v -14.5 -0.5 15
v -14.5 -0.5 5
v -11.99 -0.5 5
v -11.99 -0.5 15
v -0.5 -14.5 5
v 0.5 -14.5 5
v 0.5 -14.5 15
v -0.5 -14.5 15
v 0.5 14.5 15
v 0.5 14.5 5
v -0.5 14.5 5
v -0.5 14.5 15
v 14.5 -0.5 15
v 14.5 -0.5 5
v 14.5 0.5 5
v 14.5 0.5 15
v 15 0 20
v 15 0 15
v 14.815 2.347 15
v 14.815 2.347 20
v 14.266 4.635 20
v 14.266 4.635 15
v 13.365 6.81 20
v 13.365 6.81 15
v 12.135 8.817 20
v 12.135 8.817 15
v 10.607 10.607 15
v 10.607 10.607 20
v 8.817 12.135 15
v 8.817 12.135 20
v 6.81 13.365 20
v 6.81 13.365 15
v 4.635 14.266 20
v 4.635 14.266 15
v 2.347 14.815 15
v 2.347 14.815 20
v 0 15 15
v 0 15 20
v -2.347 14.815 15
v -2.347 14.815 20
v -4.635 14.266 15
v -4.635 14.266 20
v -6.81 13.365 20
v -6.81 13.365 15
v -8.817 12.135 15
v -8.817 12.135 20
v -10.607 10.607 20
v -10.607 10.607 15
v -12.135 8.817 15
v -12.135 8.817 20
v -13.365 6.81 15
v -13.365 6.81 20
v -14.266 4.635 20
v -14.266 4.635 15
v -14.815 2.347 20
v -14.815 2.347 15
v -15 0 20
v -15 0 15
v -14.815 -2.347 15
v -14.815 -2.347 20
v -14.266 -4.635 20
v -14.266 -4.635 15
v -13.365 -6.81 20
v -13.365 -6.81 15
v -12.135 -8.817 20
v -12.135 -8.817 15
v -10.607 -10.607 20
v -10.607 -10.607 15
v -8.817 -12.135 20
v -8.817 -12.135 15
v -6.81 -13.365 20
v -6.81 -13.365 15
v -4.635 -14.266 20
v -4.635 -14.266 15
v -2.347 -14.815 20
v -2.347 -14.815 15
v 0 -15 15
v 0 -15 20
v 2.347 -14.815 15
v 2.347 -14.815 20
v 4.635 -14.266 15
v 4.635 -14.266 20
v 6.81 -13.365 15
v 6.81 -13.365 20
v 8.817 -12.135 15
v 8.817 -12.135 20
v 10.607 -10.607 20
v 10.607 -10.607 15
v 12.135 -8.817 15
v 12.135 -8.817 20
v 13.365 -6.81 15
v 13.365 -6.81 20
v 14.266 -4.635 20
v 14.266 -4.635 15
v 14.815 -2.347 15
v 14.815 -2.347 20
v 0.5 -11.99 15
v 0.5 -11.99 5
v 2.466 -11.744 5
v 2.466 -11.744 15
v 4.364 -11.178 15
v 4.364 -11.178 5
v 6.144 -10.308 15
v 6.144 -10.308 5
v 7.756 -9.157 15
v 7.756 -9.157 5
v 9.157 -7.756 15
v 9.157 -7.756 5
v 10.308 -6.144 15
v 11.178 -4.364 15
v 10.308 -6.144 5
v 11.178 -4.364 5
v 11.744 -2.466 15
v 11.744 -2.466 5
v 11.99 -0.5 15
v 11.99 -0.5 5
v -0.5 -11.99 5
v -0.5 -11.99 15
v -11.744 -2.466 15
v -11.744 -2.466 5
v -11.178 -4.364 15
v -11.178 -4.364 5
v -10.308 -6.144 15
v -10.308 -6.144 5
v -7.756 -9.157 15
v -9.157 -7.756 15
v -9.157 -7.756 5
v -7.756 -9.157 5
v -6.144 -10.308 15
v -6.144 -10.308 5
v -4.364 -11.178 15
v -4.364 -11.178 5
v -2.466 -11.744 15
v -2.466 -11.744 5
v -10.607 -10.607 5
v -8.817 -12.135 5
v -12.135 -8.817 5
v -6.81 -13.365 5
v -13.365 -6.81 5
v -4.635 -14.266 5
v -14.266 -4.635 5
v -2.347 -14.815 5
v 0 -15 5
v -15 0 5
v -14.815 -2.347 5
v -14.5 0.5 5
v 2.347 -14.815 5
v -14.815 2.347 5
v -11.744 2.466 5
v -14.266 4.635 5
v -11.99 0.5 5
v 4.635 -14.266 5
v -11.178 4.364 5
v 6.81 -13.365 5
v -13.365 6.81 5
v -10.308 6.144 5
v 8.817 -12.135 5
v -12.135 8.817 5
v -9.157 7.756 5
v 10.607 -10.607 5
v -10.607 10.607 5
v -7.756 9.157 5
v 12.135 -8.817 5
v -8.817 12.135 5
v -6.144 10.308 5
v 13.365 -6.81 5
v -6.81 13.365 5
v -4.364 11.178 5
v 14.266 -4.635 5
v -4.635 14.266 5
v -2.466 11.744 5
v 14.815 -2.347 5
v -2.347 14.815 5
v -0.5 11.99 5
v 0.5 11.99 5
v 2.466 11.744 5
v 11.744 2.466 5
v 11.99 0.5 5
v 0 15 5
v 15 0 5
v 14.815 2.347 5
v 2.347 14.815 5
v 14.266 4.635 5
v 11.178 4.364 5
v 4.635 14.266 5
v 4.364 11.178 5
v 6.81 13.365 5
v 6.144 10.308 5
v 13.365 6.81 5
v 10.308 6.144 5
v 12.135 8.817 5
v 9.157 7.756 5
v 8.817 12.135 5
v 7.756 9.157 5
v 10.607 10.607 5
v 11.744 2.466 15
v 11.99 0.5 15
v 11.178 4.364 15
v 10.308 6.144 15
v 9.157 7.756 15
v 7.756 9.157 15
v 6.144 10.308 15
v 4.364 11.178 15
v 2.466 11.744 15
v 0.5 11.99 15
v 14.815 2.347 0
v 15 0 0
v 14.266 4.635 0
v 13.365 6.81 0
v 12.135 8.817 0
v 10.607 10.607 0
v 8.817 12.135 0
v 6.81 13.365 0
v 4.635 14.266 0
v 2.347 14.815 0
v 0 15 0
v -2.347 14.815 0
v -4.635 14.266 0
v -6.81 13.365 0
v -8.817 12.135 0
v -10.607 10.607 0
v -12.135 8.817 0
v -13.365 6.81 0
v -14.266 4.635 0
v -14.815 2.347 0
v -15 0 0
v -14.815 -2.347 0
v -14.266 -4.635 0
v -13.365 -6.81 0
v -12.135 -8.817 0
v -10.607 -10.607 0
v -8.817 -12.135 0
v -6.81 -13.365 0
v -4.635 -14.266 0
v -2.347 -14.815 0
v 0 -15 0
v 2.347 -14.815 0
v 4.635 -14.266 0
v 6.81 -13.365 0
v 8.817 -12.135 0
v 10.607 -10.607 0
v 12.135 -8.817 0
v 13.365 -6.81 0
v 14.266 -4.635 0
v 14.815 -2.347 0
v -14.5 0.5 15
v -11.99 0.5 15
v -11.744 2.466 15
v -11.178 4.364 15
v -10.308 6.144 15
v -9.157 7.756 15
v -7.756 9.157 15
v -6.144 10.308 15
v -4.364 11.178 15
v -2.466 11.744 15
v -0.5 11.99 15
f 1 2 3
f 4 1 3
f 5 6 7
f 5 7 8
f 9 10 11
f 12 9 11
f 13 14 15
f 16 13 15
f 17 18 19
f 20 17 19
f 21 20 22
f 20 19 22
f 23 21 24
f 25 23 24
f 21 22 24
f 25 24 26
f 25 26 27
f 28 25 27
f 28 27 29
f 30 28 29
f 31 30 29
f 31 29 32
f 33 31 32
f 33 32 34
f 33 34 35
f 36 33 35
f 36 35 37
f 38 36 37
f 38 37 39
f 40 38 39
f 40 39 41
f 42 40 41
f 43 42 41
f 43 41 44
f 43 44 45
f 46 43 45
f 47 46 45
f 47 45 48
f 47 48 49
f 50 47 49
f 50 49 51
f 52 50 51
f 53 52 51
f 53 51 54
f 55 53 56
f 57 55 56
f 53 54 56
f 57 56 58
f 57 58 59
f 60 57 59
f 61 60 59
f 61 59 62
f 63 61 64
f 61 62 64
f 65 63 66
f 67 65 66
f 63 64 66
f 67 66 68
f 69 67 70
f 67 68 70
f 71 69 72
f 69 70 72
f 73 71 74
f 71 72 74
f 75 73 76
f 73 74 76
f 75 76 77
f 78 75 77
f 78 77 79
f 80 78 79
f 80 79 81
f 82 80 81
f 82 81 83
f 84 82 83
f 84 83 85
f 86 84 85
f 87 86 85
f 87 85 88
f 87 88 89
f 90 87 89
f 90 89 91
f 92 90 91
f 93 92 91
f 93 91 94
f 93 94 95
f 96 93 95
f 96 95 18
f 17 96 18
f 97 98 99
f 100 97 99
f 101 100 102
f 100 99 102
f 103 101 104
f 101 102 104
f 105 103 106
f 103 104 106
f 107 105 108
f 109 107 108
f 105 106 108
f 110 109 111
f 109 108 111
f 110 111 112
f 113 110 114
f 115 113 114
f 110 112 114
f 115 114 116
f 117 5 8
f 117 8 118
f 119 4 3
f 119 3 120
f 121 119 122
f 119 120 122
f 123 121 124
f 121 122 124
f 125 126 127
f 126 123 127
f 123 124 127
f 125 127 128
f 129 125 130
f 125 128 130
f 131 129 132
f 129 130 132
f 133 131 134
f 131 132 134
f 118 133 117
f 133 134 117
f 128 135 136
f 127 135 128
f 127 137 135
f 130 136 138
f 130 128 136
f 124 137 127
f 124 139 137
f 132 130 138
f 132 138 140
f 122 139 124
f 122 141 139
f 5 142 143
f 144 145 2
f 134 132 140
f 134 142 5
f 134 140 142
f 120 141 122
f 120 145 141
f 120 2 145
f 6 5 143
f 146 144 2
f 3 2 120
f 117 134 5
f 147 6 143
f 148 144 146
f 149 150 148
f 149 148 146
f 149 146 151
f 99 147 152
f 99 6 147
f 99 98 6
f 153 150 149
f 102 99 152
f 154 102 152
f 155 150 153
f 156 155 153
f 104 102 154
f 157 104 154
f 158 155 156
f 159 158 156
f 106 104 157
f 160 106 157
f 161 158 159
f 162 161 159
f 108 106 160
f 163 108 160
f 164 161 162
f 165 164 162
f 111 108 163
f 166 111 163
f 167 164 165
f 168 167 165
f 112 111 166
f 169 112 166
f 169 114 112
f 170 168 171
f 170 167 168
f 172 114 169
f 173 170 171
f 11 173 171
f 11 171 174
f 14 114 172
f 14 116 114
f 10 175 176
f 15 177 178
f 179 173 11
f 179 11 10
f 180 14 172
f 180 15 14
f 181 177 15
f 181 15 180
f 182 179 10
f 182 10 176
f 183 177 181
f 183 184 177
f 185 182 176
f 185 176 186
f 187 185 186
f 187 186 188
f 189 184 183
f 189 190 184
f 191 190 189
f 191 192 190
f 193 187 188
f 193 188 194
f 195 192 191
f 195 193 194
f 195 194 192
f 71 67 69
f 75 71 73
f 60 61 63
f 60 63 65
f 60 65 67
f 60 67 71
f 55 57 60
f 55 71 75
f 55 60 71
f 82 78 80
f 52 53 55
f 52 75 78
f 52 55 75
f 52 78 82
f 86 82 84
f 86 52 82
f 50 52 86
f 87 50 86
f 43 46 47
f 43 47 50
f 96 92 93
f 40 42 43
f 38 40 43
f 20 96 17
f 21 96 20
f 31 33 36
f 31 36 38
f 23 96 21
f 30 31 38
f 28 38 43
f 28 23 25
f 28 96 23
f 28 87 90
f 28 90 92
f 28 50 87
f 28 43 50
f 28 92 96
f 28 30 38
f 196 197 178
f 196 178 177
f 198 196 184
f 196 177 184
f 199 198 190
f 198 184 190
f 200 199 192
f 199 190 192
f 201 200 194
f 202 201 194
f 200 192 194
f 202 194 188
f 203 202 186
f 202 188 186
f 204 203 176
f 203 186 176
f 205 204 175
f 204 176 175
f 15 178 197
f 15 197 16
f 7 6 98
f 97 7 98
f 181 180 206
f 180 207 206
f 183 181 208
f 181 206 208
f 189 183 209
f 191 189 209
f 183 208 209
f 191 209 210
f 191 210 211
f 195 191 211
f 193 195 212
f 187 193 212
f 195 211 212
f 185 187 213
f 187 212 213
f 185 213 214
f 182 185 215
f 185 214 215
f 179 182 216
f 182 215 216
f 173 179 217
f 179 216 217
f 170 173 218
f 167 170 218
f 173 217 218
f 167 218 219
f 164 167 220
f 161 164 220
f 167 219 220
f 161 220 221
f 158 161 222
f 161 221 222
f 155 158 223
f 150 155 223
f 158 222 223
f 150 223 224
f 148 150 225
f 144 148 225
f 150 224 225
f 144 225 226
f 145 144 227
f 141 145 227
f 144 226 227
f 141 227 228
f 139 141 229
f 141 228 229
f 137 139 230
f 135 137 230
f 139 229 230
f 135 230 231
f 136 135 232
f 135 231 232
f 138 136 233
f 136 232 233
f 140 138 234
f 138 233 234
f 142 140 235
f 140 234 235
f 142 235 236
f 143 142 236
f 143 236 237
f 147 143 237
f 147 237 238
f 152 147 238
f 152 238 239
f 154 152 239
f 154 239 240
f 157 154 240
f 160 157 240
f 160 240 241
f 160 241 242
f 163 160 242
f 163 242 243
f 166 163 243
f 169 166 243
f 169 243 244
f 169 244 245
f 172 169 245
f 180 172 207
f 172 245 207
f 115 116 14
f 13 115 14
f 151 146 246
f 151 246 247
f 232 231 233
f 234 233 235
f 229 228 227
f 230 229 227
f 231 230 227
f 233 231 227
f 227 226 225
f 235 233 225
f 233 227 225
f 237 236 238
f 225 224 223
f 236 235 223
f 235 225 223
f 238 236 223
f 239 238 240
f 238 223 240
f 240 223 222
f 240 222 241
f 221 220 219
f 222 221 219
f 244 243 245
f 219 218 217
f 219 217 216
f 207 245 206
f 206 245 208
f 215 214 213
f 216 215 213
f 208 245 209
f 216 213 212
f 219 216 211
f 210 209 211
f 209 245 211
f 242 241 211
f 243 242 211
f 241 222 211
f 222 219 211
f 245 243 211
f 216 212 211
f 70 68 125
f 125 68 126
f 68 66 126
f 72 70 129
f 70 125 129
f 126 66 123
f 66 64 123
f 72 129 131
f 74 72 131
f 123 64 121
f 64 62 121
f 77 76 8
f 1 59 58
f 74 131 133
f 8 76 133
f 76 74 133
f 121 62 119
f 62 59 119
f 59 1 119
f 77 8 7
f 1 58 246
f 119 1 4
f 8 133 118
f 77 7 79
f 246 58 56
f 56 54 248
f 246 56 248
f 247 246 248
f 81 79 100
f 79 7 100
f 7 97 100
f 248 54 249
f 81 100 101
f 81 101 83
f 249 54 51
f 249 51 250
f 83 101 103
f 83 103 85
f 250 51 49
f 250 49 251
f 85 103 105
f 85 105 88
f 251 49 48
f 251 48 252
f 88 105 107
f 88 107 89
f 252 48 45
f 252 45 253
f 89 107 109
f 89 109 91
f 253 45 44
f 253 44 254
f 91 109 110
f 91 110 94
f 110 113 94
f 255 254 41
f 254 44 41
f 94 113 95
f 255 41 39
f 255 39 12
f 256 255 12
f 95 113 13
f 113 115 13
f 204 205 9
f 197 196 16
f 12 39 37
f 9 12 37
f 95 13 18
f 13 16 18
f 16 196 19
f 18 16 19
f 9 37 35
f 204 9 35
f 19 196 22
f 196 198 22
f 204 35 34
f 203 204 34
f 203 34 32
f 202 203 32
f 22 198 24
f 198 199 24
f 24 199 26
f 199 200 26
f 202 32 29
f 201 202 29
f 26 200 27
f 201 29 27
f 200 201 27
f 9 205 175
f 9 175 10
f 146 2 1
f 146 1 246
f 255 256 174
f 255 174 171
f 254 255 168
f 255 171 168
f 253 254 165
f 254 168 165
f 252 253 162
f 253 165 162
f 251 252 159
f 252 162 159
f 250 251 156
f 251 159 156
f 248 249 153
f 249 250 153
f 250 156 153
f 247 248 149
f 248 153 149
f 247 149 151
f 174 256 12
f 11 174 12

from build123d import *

# Parameters (mm, degrees)
CYLINDER005_R               = 12
CYLINDER005_DEPTH           = 20
CYLINDER006_R               = 15
CYLINDER006_DEPTH           = 3.5
CYLINDER007_R               = 15
CYLINDER007_DEPTH           = 1.5
CYLINDER008_R               = 15
CYLINDER008_DEPTH           = 1.5
CYLINDER009_R               = 15
CYLINDER009_DEPTH           = 3.5
BOX002_W                    = 29
BOX002_H                    = 1
BOX002_DEPTH                = 10
BOX003_W                    = 29
BOX003_H                    = 1
BOX003_DEPTH                = 10
COMPOUND001_PLACEMENT_ANGLE = 90


with BuildPart() as cylinder005:
    # Cylinder005 → Cylinder005 (new body)
    with BuildSketch(Plane.XY):
        Circle(CYLINDER005_R)
    extrude(amount=CYLINDER005_DEPTH)


with BuildPart() as cylinder006:
    # Cylinder006 → Cylinder006 (new body)
    with BuildSketch(Plane.XY):
        Circle(CYLINDER006_R)
    extrude(amount=CYLINDER006_DEPTH)


with BuildPart() as cylinder007:
    # Cylinder007 → Cylinder007 (new body)
    with BuildSketch(Plane.XY.offset(3.5)):
        Circle(CYLINDER007_R)
    extrude(amount=CYLINDER007_DEPTH)


with BuildPart() as cylinder008:
    # Cylinder008 → Cylinder008 (new body)
    with BuildSketch(Plane.XY.offset(18.5)):
        Circle(CYLINDER008_R)
    extrude(amount=CYLINDER008_DEPTH)


with BuildPart() as cylinder009:
    # Cylinder009 → Cylinder009 (new body)
    with BuildSketch(Plane.XY.offset(15)):
        Circle(CYLINDER009_R)
    extrude(amount=CYLINDER009_DEPTH)


with BuildPart() as cube002:
    # Box002 → Box002 (new body)
    with BuildSketch(Plane(origin=(-14.5, -0.5, 5), x_dir=(1, 0, 0), z_dir=(0, 0, 1))):
        with Locations((14.5, 0.5)):
            Rectangle(BOX002_W, BOX002_H)
    extrude(amount=BOX002_DEPTH)


with BuildPart() as basewheel_filledsides:
    # Box003 → Box003 (new body)
    with BuildSketch(Plane(origin=(-14.5, -0.5, 5), x_dir=(1, 0, 0), z_dir=(0, 0, 1))):
        with Locations((14.5, 0.5)):
            Rectangle(BOX003_W, BOX003_H)
    extrude(amount=BOX003_DEPTH)


with BuildPart() as basewheel_filledsides_1:
    # Compound001 placement: moved
    add(basewheel_filledsides.part.rotate(Axis((0, 0, 0), (0, 0, 1)), COMPOUND001_PLACEMENT_ANGLE))

    # Fusion001: union Cylinder005, Cylinder006, Cylinder007, Cylinder008, Cylinder009, Cube002
    add(cylinder005.part)
    add(cylinder006.part)
    add(cylinder007.part)
    add(cylinder008.part)
    add(cylinder009.part)
    add(cube002.part)


solid = basewheel_filledsides_1.part
